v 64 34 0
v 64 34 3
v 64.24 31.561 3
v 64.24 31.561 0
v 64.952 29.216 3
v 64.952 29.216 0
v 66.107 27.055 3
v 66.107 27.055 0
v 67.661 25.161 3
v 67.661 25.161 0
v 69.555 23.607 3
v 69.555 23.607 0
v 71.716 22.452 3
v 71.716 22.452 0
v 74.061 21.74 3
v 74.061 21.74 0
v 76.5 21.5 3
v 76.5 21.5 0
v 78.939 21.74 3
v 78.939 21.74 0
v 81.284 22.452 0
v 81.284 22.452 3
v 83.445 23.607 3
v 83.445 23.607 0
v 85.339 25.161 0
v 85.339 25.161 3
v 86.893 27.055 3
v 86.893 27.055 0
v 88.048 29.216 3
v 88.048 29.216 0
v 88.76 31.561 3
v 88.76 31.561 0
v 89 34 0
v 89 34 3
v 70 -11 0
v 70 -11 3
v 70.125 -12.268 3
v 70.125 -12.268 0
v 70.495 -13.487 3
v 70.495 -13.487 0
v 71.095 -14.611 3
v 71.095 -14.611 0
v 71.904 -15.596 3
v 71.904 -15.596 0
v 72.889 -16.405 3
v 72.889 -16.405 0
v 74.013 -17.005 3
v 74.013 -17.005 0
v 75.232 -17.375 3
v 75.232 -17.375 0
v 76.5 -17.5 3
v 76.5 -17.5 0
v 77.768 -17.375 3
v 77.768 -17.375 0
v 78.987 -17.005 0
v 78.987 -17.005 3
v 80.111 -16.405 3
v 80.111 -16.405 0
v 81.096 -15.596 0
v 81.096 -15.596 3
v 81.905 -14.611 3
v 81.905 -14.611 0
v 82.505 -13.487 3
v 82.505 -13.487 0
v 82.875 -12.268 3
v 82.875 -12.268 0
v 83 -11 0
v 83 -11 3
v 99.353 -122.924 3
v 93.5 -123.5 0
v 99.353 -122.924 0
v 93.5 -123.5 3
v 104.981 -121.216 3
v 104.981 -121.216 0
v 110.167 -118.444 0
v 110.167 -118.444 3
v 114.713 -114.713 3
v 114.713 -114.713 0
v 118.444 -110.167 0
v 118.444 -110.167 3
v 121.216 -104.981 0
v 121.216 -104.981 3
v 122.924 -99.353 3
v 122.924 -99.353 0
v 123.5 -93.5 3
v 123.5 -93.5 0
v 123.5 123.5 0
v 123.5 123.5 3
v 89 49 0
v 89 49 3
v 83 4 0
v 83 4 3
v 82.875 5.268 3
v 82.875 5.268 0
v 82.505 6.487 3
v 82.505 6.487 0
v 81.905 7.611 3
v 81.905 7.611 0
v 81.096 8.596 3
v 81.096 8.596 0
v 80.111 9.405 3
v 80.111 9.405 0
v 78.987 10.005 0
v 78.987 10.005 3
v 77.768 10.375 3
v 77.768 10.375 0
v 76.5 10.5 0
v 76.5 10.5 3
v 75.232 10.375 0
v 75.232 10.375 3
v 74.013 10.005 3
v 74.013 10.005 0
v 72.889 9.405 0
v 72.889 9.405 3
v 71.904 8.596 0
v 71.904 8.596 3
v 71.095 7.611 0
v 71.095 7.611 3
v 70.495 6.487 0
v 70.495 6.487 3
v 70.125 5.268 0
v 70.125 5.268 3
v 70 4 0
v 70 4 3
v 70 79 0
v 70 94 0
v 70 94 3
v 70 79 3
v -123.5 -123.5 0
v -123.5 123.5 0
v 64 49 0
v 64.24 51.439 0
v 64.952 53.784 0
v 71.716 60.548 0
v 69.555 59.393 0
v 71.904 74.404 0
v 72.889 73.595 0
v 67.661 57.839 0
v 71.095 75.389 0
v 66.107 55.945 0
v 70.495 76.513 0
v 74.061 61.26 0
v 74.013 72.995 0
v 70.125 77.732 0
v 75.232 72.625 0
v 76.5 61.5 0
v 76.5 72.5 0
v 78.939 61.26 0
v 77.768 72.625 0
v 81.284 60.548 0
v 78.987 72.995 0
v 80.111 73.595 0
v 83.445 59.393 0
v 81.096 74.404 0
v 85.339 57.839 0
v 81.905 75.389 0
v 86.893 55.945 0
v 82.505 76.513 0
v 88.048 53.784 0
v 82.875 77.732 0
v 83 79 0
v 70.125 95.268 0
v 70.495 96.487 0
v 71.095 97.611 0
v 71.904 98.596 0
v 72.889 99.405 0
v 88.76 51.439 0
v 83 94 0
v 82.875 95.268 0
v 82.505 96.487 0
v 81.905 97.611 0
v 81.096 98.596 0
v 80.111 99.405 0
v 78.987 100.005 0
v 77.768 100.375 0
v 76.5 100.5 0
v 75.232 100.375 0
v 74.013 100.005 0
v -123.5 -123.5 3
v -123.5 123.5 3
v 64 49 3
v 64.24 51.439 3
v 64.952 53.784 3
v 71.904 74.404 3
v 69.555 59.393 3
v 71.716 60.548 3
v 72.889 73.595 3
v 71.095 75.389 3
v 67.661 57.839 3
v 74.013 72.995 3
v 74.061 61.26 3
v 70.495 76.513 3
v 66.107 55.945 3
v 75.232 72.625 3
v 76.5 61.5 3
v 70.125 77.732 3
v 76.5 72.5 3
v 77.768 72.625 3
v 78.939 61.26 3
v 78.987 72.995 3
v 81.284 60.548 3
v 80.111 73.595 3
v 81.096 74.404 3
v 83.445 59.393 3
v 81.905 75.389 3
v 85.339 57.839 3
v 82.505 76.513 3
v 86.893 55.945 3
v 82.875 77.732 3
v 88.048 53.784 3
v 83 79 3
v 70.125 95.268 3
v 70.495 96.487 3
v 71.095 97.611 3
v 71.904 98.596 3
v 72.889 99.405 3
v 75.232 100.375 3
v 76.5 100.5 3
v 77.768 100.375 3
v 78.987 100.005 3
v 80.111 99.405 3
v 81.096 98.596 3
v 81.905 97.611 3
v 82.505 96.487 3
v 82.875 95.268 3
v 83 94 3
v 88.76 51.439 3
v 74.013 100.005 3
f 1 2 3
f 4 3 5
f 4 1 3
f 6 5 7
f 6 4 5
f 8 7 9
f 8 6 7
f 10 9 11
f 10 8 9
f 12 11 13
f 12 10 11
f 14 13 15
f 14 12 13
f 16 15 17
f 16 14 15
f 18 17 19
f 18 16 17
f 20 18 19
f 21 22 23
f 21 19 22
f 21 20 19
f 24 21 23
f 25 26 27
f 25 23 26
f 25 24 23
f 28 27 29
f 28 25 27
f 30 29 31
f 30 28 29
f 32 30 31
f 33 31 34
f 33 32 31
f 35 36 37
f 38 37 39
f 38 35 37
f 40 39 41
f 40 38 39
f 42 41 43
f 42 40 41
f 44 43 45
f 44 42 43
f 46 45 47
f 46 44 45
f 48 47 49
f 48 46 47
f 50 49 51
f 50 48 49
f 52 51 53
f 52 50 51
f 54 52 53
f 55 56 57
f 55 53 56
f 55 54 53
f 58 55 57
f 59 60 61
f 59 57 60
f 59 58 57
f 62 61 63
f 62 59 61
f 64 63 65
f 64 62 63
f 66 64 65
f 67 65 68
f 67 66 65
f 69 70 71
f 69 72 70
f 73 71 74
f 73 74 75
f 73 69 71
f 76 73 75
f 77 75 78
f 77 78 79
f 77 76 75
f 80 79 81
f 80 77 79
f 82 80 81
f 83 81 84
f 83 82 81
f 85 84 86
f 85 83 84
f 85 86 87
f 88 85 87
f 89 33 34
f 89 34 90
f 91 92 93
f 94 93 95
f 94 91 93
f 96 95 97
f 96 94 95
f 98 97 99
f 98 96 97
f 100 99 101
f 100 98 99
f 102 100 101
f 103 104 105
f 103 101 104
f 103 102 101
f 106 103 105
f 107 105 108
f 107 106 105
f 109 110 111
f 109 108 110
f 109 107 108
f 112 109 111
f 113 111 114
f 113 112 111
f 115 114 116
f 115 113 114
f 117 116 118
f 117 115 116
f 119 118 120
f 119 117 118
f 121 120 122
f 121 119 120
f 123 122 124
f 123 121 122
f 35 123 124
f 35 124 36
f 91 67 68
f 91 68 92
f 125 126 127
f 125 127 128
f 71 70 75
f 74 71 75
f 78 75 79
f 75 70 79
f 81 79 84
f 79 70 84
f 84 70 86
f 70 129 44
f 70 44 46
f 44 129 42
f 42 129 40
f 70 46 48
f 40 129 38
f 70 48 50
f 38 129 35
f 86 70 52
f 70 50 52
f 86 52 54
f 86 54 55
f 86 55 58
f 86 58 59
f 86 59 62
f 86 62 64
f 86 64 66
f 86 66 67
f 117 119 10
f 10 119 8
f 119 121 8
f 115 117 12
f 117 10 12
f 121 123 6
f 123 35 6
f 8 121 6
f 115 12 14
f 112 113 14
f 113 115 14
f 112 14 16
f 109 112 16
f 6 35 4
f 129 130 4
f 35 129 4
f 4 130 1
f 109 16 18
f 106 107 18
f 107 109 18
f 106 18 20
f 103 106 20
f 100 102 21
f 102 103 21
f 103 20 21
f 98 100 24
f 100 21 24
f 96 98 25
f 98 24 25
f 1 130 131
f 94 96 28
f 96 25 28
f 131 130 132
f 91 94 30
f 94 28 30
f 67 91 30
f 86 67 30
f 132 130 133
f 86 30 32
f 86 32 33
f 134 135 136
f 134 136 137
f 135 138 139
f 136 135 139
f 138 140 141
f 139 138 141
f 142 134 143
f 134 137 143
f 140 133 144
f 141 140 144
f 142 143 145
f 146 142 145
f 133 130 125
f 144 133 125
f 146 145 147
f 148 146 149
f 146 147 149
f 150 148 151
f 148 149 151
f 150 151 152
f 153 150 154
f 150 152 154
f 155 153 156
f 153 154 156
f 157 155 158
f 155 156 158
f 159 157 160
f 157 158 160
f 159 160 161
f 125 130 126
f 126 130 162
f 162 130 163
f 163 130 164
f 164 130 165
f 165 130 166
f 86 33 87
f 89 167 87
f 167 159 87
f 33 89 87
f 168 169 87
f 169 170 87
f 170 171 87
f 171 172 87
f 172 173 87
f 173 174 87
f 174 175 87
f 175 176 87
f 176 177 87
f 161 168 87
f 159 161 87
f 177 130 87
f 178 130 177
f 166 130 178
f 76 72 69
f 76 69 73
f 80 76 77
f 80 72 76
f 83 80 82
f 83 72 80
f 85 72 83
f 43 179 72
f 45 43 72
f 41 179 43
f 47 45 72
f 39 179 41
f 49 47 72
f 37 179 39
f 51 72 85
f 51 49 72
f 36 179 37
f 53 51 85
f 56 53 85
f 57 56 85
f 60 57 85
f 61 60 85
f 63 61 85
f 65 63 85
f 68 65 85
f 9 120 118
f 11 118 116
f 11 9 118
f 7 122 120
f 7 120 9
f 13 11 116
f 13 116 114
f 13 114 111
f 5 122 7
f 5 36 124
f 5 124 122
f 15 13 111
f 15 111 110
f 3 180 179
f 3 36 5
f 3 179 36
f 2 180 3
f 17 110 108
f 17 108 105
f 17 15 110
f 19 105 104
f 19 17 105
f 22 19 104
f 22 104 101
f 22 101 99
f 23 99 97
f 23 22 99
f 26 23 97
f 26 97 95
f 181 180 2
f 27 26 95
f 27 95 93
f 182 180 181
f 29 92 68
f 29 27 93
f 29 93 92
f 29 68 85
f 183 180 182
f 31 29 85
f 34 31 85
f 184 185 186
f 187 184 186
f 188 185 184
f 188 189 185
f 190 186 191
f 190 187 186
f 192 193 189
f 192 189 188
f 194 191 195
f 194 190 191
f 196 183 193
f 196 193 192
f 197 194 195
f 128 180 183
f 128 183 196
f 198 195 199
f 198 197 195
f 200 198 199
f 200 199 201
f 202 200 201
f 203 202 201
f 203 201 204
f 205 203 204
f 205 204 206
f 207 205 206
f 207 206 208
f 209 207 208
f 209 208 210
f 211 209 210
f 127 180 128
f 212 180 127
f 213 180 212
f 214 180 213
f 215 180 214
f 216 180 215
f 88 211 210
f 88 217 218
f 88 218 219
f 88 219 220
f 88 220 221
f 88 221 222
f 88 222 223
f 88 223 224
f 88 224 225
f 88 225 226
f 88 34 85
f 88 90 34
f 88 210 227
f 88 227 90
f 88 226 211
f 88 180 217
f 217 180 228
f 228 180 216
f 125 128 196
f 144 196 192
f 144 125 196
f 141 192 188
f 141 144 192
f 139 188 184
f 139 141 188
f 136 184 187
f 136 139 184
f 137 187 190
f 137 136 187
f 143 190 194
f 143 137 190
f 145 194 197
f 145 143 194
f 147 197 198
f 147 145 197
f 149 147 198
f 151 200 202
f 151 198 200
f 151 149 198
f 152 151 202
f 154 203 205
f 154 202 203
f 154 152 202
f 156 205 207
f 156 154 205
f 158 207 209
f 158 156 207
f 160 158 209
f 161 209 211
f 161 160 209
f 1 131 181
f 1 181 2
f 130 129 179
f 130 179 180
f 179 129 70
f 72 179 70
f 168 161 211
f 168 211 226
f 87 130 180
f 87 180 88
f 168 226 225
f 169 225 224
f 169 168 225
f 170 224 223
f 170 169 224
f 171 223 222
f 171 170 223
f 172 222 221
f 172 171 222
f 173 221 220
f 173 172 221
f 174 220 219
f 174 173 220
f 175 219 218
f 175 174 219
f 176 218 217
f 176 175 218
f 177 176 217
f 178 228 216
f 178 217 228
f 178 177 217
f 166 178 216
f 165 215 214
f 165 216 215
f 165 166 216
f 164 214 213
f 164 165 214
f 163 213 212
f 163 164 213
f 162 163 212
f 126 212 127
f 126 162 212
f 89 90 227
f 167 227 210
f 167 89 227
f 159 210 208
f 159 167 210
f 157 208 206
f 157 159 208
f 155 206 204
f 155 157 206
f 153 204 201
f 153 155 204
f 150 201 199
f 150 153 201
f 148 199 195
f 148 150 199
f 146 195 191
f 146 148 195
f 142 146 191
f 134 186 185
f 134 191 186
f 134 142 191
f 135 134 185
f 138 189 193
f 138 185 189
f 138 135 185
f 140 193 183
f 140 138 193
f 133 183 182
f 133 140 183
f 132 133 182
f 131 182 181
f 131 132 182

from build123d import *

# Parameters (mm, degrees)
ESQUISSE1_W             = 247
ESQUISSE1_H             = 247
ESQUISSE1_R             = 12.5
ESQUISSE1_R_2           = 6.5
BOSS_EXTRU_1_DEPTH      = 3
CONG_1_R                = 30
ENL_V_MAT_EXTRU_2_DEPTH = 10


with BuildPart() as part:
    # Esquisse1 → Boss.-Extru.1 (new body)
    with BuildSketch(Plane.XY):
        Rectangle(ESQUISSE1_W, ESQUISSE1_H)
        with Locations((76.5, 41.5)):
            Circle(ESQUISSE1_R, mode=Mode.SUBTRACT)
        with Locations((76.5, 86.5)):
            Circle(ESQUISSE1_R_2, mode=Mode.SUBTRACT)
        with Locations((76.5, -3.5)):
            Circle(ESQUISSE1_R_2, mode=Mode.SUBTRACT)
    extrude(amount=BOSS_EXTRU_1_DEPTH)

    # Congé1
    cong_1_edges = [part.edges().sort_by_distance(p)[0] for p in [
        (123.5, -123.5, 1.5),
    ]]
    fillet(cong_1_edges, radius=CONG_1_R)

    # Esquisse4 → Enlèv. mat.-Extru.2 (cut)
    with BuildSketch(Plane(origin=(0, 0, 0), x_dir=(-1, 0, 0), z_dir=(0, 0, -1))):
        with BuildLine():
            Line((-83, 79), (-83, 94))
            ThreePointArc((-83, 94), (-76.5, 100.5), (-70, 94))
            Line((-70, 94), (-70, 79))
            ThreePointArc((-70, 79), (-76.5, 72.5), (-83, 79))
        make_face()
        with BuildLine():
            Line((-83, -11), (-83, 4))
            ThreePointArc((-83, 4), (-76.5, 10.5), (-70, 4))
            Line((-70, 4), (-70, -11))
            ThreePointArc((-70, -11), (-76.5, -17.5), (-83, -11))
        make_face()
        with BuildLine():
            Line((-89, 34), (-89, 49))
            ThreePointArc((-89, 49), (-76.5, 61.5), (-64, 49))
            Line((-64, 49), (-64, 34))
            ThreePointArc((-64, 34), (-76.5, 21.5), (-89, 34))
        make_face()
    extrude(amount=-ENL_V_MAT_EXTRU_2_DEPTH, mode=Mode.SUBTRACT)


solid = part.part
